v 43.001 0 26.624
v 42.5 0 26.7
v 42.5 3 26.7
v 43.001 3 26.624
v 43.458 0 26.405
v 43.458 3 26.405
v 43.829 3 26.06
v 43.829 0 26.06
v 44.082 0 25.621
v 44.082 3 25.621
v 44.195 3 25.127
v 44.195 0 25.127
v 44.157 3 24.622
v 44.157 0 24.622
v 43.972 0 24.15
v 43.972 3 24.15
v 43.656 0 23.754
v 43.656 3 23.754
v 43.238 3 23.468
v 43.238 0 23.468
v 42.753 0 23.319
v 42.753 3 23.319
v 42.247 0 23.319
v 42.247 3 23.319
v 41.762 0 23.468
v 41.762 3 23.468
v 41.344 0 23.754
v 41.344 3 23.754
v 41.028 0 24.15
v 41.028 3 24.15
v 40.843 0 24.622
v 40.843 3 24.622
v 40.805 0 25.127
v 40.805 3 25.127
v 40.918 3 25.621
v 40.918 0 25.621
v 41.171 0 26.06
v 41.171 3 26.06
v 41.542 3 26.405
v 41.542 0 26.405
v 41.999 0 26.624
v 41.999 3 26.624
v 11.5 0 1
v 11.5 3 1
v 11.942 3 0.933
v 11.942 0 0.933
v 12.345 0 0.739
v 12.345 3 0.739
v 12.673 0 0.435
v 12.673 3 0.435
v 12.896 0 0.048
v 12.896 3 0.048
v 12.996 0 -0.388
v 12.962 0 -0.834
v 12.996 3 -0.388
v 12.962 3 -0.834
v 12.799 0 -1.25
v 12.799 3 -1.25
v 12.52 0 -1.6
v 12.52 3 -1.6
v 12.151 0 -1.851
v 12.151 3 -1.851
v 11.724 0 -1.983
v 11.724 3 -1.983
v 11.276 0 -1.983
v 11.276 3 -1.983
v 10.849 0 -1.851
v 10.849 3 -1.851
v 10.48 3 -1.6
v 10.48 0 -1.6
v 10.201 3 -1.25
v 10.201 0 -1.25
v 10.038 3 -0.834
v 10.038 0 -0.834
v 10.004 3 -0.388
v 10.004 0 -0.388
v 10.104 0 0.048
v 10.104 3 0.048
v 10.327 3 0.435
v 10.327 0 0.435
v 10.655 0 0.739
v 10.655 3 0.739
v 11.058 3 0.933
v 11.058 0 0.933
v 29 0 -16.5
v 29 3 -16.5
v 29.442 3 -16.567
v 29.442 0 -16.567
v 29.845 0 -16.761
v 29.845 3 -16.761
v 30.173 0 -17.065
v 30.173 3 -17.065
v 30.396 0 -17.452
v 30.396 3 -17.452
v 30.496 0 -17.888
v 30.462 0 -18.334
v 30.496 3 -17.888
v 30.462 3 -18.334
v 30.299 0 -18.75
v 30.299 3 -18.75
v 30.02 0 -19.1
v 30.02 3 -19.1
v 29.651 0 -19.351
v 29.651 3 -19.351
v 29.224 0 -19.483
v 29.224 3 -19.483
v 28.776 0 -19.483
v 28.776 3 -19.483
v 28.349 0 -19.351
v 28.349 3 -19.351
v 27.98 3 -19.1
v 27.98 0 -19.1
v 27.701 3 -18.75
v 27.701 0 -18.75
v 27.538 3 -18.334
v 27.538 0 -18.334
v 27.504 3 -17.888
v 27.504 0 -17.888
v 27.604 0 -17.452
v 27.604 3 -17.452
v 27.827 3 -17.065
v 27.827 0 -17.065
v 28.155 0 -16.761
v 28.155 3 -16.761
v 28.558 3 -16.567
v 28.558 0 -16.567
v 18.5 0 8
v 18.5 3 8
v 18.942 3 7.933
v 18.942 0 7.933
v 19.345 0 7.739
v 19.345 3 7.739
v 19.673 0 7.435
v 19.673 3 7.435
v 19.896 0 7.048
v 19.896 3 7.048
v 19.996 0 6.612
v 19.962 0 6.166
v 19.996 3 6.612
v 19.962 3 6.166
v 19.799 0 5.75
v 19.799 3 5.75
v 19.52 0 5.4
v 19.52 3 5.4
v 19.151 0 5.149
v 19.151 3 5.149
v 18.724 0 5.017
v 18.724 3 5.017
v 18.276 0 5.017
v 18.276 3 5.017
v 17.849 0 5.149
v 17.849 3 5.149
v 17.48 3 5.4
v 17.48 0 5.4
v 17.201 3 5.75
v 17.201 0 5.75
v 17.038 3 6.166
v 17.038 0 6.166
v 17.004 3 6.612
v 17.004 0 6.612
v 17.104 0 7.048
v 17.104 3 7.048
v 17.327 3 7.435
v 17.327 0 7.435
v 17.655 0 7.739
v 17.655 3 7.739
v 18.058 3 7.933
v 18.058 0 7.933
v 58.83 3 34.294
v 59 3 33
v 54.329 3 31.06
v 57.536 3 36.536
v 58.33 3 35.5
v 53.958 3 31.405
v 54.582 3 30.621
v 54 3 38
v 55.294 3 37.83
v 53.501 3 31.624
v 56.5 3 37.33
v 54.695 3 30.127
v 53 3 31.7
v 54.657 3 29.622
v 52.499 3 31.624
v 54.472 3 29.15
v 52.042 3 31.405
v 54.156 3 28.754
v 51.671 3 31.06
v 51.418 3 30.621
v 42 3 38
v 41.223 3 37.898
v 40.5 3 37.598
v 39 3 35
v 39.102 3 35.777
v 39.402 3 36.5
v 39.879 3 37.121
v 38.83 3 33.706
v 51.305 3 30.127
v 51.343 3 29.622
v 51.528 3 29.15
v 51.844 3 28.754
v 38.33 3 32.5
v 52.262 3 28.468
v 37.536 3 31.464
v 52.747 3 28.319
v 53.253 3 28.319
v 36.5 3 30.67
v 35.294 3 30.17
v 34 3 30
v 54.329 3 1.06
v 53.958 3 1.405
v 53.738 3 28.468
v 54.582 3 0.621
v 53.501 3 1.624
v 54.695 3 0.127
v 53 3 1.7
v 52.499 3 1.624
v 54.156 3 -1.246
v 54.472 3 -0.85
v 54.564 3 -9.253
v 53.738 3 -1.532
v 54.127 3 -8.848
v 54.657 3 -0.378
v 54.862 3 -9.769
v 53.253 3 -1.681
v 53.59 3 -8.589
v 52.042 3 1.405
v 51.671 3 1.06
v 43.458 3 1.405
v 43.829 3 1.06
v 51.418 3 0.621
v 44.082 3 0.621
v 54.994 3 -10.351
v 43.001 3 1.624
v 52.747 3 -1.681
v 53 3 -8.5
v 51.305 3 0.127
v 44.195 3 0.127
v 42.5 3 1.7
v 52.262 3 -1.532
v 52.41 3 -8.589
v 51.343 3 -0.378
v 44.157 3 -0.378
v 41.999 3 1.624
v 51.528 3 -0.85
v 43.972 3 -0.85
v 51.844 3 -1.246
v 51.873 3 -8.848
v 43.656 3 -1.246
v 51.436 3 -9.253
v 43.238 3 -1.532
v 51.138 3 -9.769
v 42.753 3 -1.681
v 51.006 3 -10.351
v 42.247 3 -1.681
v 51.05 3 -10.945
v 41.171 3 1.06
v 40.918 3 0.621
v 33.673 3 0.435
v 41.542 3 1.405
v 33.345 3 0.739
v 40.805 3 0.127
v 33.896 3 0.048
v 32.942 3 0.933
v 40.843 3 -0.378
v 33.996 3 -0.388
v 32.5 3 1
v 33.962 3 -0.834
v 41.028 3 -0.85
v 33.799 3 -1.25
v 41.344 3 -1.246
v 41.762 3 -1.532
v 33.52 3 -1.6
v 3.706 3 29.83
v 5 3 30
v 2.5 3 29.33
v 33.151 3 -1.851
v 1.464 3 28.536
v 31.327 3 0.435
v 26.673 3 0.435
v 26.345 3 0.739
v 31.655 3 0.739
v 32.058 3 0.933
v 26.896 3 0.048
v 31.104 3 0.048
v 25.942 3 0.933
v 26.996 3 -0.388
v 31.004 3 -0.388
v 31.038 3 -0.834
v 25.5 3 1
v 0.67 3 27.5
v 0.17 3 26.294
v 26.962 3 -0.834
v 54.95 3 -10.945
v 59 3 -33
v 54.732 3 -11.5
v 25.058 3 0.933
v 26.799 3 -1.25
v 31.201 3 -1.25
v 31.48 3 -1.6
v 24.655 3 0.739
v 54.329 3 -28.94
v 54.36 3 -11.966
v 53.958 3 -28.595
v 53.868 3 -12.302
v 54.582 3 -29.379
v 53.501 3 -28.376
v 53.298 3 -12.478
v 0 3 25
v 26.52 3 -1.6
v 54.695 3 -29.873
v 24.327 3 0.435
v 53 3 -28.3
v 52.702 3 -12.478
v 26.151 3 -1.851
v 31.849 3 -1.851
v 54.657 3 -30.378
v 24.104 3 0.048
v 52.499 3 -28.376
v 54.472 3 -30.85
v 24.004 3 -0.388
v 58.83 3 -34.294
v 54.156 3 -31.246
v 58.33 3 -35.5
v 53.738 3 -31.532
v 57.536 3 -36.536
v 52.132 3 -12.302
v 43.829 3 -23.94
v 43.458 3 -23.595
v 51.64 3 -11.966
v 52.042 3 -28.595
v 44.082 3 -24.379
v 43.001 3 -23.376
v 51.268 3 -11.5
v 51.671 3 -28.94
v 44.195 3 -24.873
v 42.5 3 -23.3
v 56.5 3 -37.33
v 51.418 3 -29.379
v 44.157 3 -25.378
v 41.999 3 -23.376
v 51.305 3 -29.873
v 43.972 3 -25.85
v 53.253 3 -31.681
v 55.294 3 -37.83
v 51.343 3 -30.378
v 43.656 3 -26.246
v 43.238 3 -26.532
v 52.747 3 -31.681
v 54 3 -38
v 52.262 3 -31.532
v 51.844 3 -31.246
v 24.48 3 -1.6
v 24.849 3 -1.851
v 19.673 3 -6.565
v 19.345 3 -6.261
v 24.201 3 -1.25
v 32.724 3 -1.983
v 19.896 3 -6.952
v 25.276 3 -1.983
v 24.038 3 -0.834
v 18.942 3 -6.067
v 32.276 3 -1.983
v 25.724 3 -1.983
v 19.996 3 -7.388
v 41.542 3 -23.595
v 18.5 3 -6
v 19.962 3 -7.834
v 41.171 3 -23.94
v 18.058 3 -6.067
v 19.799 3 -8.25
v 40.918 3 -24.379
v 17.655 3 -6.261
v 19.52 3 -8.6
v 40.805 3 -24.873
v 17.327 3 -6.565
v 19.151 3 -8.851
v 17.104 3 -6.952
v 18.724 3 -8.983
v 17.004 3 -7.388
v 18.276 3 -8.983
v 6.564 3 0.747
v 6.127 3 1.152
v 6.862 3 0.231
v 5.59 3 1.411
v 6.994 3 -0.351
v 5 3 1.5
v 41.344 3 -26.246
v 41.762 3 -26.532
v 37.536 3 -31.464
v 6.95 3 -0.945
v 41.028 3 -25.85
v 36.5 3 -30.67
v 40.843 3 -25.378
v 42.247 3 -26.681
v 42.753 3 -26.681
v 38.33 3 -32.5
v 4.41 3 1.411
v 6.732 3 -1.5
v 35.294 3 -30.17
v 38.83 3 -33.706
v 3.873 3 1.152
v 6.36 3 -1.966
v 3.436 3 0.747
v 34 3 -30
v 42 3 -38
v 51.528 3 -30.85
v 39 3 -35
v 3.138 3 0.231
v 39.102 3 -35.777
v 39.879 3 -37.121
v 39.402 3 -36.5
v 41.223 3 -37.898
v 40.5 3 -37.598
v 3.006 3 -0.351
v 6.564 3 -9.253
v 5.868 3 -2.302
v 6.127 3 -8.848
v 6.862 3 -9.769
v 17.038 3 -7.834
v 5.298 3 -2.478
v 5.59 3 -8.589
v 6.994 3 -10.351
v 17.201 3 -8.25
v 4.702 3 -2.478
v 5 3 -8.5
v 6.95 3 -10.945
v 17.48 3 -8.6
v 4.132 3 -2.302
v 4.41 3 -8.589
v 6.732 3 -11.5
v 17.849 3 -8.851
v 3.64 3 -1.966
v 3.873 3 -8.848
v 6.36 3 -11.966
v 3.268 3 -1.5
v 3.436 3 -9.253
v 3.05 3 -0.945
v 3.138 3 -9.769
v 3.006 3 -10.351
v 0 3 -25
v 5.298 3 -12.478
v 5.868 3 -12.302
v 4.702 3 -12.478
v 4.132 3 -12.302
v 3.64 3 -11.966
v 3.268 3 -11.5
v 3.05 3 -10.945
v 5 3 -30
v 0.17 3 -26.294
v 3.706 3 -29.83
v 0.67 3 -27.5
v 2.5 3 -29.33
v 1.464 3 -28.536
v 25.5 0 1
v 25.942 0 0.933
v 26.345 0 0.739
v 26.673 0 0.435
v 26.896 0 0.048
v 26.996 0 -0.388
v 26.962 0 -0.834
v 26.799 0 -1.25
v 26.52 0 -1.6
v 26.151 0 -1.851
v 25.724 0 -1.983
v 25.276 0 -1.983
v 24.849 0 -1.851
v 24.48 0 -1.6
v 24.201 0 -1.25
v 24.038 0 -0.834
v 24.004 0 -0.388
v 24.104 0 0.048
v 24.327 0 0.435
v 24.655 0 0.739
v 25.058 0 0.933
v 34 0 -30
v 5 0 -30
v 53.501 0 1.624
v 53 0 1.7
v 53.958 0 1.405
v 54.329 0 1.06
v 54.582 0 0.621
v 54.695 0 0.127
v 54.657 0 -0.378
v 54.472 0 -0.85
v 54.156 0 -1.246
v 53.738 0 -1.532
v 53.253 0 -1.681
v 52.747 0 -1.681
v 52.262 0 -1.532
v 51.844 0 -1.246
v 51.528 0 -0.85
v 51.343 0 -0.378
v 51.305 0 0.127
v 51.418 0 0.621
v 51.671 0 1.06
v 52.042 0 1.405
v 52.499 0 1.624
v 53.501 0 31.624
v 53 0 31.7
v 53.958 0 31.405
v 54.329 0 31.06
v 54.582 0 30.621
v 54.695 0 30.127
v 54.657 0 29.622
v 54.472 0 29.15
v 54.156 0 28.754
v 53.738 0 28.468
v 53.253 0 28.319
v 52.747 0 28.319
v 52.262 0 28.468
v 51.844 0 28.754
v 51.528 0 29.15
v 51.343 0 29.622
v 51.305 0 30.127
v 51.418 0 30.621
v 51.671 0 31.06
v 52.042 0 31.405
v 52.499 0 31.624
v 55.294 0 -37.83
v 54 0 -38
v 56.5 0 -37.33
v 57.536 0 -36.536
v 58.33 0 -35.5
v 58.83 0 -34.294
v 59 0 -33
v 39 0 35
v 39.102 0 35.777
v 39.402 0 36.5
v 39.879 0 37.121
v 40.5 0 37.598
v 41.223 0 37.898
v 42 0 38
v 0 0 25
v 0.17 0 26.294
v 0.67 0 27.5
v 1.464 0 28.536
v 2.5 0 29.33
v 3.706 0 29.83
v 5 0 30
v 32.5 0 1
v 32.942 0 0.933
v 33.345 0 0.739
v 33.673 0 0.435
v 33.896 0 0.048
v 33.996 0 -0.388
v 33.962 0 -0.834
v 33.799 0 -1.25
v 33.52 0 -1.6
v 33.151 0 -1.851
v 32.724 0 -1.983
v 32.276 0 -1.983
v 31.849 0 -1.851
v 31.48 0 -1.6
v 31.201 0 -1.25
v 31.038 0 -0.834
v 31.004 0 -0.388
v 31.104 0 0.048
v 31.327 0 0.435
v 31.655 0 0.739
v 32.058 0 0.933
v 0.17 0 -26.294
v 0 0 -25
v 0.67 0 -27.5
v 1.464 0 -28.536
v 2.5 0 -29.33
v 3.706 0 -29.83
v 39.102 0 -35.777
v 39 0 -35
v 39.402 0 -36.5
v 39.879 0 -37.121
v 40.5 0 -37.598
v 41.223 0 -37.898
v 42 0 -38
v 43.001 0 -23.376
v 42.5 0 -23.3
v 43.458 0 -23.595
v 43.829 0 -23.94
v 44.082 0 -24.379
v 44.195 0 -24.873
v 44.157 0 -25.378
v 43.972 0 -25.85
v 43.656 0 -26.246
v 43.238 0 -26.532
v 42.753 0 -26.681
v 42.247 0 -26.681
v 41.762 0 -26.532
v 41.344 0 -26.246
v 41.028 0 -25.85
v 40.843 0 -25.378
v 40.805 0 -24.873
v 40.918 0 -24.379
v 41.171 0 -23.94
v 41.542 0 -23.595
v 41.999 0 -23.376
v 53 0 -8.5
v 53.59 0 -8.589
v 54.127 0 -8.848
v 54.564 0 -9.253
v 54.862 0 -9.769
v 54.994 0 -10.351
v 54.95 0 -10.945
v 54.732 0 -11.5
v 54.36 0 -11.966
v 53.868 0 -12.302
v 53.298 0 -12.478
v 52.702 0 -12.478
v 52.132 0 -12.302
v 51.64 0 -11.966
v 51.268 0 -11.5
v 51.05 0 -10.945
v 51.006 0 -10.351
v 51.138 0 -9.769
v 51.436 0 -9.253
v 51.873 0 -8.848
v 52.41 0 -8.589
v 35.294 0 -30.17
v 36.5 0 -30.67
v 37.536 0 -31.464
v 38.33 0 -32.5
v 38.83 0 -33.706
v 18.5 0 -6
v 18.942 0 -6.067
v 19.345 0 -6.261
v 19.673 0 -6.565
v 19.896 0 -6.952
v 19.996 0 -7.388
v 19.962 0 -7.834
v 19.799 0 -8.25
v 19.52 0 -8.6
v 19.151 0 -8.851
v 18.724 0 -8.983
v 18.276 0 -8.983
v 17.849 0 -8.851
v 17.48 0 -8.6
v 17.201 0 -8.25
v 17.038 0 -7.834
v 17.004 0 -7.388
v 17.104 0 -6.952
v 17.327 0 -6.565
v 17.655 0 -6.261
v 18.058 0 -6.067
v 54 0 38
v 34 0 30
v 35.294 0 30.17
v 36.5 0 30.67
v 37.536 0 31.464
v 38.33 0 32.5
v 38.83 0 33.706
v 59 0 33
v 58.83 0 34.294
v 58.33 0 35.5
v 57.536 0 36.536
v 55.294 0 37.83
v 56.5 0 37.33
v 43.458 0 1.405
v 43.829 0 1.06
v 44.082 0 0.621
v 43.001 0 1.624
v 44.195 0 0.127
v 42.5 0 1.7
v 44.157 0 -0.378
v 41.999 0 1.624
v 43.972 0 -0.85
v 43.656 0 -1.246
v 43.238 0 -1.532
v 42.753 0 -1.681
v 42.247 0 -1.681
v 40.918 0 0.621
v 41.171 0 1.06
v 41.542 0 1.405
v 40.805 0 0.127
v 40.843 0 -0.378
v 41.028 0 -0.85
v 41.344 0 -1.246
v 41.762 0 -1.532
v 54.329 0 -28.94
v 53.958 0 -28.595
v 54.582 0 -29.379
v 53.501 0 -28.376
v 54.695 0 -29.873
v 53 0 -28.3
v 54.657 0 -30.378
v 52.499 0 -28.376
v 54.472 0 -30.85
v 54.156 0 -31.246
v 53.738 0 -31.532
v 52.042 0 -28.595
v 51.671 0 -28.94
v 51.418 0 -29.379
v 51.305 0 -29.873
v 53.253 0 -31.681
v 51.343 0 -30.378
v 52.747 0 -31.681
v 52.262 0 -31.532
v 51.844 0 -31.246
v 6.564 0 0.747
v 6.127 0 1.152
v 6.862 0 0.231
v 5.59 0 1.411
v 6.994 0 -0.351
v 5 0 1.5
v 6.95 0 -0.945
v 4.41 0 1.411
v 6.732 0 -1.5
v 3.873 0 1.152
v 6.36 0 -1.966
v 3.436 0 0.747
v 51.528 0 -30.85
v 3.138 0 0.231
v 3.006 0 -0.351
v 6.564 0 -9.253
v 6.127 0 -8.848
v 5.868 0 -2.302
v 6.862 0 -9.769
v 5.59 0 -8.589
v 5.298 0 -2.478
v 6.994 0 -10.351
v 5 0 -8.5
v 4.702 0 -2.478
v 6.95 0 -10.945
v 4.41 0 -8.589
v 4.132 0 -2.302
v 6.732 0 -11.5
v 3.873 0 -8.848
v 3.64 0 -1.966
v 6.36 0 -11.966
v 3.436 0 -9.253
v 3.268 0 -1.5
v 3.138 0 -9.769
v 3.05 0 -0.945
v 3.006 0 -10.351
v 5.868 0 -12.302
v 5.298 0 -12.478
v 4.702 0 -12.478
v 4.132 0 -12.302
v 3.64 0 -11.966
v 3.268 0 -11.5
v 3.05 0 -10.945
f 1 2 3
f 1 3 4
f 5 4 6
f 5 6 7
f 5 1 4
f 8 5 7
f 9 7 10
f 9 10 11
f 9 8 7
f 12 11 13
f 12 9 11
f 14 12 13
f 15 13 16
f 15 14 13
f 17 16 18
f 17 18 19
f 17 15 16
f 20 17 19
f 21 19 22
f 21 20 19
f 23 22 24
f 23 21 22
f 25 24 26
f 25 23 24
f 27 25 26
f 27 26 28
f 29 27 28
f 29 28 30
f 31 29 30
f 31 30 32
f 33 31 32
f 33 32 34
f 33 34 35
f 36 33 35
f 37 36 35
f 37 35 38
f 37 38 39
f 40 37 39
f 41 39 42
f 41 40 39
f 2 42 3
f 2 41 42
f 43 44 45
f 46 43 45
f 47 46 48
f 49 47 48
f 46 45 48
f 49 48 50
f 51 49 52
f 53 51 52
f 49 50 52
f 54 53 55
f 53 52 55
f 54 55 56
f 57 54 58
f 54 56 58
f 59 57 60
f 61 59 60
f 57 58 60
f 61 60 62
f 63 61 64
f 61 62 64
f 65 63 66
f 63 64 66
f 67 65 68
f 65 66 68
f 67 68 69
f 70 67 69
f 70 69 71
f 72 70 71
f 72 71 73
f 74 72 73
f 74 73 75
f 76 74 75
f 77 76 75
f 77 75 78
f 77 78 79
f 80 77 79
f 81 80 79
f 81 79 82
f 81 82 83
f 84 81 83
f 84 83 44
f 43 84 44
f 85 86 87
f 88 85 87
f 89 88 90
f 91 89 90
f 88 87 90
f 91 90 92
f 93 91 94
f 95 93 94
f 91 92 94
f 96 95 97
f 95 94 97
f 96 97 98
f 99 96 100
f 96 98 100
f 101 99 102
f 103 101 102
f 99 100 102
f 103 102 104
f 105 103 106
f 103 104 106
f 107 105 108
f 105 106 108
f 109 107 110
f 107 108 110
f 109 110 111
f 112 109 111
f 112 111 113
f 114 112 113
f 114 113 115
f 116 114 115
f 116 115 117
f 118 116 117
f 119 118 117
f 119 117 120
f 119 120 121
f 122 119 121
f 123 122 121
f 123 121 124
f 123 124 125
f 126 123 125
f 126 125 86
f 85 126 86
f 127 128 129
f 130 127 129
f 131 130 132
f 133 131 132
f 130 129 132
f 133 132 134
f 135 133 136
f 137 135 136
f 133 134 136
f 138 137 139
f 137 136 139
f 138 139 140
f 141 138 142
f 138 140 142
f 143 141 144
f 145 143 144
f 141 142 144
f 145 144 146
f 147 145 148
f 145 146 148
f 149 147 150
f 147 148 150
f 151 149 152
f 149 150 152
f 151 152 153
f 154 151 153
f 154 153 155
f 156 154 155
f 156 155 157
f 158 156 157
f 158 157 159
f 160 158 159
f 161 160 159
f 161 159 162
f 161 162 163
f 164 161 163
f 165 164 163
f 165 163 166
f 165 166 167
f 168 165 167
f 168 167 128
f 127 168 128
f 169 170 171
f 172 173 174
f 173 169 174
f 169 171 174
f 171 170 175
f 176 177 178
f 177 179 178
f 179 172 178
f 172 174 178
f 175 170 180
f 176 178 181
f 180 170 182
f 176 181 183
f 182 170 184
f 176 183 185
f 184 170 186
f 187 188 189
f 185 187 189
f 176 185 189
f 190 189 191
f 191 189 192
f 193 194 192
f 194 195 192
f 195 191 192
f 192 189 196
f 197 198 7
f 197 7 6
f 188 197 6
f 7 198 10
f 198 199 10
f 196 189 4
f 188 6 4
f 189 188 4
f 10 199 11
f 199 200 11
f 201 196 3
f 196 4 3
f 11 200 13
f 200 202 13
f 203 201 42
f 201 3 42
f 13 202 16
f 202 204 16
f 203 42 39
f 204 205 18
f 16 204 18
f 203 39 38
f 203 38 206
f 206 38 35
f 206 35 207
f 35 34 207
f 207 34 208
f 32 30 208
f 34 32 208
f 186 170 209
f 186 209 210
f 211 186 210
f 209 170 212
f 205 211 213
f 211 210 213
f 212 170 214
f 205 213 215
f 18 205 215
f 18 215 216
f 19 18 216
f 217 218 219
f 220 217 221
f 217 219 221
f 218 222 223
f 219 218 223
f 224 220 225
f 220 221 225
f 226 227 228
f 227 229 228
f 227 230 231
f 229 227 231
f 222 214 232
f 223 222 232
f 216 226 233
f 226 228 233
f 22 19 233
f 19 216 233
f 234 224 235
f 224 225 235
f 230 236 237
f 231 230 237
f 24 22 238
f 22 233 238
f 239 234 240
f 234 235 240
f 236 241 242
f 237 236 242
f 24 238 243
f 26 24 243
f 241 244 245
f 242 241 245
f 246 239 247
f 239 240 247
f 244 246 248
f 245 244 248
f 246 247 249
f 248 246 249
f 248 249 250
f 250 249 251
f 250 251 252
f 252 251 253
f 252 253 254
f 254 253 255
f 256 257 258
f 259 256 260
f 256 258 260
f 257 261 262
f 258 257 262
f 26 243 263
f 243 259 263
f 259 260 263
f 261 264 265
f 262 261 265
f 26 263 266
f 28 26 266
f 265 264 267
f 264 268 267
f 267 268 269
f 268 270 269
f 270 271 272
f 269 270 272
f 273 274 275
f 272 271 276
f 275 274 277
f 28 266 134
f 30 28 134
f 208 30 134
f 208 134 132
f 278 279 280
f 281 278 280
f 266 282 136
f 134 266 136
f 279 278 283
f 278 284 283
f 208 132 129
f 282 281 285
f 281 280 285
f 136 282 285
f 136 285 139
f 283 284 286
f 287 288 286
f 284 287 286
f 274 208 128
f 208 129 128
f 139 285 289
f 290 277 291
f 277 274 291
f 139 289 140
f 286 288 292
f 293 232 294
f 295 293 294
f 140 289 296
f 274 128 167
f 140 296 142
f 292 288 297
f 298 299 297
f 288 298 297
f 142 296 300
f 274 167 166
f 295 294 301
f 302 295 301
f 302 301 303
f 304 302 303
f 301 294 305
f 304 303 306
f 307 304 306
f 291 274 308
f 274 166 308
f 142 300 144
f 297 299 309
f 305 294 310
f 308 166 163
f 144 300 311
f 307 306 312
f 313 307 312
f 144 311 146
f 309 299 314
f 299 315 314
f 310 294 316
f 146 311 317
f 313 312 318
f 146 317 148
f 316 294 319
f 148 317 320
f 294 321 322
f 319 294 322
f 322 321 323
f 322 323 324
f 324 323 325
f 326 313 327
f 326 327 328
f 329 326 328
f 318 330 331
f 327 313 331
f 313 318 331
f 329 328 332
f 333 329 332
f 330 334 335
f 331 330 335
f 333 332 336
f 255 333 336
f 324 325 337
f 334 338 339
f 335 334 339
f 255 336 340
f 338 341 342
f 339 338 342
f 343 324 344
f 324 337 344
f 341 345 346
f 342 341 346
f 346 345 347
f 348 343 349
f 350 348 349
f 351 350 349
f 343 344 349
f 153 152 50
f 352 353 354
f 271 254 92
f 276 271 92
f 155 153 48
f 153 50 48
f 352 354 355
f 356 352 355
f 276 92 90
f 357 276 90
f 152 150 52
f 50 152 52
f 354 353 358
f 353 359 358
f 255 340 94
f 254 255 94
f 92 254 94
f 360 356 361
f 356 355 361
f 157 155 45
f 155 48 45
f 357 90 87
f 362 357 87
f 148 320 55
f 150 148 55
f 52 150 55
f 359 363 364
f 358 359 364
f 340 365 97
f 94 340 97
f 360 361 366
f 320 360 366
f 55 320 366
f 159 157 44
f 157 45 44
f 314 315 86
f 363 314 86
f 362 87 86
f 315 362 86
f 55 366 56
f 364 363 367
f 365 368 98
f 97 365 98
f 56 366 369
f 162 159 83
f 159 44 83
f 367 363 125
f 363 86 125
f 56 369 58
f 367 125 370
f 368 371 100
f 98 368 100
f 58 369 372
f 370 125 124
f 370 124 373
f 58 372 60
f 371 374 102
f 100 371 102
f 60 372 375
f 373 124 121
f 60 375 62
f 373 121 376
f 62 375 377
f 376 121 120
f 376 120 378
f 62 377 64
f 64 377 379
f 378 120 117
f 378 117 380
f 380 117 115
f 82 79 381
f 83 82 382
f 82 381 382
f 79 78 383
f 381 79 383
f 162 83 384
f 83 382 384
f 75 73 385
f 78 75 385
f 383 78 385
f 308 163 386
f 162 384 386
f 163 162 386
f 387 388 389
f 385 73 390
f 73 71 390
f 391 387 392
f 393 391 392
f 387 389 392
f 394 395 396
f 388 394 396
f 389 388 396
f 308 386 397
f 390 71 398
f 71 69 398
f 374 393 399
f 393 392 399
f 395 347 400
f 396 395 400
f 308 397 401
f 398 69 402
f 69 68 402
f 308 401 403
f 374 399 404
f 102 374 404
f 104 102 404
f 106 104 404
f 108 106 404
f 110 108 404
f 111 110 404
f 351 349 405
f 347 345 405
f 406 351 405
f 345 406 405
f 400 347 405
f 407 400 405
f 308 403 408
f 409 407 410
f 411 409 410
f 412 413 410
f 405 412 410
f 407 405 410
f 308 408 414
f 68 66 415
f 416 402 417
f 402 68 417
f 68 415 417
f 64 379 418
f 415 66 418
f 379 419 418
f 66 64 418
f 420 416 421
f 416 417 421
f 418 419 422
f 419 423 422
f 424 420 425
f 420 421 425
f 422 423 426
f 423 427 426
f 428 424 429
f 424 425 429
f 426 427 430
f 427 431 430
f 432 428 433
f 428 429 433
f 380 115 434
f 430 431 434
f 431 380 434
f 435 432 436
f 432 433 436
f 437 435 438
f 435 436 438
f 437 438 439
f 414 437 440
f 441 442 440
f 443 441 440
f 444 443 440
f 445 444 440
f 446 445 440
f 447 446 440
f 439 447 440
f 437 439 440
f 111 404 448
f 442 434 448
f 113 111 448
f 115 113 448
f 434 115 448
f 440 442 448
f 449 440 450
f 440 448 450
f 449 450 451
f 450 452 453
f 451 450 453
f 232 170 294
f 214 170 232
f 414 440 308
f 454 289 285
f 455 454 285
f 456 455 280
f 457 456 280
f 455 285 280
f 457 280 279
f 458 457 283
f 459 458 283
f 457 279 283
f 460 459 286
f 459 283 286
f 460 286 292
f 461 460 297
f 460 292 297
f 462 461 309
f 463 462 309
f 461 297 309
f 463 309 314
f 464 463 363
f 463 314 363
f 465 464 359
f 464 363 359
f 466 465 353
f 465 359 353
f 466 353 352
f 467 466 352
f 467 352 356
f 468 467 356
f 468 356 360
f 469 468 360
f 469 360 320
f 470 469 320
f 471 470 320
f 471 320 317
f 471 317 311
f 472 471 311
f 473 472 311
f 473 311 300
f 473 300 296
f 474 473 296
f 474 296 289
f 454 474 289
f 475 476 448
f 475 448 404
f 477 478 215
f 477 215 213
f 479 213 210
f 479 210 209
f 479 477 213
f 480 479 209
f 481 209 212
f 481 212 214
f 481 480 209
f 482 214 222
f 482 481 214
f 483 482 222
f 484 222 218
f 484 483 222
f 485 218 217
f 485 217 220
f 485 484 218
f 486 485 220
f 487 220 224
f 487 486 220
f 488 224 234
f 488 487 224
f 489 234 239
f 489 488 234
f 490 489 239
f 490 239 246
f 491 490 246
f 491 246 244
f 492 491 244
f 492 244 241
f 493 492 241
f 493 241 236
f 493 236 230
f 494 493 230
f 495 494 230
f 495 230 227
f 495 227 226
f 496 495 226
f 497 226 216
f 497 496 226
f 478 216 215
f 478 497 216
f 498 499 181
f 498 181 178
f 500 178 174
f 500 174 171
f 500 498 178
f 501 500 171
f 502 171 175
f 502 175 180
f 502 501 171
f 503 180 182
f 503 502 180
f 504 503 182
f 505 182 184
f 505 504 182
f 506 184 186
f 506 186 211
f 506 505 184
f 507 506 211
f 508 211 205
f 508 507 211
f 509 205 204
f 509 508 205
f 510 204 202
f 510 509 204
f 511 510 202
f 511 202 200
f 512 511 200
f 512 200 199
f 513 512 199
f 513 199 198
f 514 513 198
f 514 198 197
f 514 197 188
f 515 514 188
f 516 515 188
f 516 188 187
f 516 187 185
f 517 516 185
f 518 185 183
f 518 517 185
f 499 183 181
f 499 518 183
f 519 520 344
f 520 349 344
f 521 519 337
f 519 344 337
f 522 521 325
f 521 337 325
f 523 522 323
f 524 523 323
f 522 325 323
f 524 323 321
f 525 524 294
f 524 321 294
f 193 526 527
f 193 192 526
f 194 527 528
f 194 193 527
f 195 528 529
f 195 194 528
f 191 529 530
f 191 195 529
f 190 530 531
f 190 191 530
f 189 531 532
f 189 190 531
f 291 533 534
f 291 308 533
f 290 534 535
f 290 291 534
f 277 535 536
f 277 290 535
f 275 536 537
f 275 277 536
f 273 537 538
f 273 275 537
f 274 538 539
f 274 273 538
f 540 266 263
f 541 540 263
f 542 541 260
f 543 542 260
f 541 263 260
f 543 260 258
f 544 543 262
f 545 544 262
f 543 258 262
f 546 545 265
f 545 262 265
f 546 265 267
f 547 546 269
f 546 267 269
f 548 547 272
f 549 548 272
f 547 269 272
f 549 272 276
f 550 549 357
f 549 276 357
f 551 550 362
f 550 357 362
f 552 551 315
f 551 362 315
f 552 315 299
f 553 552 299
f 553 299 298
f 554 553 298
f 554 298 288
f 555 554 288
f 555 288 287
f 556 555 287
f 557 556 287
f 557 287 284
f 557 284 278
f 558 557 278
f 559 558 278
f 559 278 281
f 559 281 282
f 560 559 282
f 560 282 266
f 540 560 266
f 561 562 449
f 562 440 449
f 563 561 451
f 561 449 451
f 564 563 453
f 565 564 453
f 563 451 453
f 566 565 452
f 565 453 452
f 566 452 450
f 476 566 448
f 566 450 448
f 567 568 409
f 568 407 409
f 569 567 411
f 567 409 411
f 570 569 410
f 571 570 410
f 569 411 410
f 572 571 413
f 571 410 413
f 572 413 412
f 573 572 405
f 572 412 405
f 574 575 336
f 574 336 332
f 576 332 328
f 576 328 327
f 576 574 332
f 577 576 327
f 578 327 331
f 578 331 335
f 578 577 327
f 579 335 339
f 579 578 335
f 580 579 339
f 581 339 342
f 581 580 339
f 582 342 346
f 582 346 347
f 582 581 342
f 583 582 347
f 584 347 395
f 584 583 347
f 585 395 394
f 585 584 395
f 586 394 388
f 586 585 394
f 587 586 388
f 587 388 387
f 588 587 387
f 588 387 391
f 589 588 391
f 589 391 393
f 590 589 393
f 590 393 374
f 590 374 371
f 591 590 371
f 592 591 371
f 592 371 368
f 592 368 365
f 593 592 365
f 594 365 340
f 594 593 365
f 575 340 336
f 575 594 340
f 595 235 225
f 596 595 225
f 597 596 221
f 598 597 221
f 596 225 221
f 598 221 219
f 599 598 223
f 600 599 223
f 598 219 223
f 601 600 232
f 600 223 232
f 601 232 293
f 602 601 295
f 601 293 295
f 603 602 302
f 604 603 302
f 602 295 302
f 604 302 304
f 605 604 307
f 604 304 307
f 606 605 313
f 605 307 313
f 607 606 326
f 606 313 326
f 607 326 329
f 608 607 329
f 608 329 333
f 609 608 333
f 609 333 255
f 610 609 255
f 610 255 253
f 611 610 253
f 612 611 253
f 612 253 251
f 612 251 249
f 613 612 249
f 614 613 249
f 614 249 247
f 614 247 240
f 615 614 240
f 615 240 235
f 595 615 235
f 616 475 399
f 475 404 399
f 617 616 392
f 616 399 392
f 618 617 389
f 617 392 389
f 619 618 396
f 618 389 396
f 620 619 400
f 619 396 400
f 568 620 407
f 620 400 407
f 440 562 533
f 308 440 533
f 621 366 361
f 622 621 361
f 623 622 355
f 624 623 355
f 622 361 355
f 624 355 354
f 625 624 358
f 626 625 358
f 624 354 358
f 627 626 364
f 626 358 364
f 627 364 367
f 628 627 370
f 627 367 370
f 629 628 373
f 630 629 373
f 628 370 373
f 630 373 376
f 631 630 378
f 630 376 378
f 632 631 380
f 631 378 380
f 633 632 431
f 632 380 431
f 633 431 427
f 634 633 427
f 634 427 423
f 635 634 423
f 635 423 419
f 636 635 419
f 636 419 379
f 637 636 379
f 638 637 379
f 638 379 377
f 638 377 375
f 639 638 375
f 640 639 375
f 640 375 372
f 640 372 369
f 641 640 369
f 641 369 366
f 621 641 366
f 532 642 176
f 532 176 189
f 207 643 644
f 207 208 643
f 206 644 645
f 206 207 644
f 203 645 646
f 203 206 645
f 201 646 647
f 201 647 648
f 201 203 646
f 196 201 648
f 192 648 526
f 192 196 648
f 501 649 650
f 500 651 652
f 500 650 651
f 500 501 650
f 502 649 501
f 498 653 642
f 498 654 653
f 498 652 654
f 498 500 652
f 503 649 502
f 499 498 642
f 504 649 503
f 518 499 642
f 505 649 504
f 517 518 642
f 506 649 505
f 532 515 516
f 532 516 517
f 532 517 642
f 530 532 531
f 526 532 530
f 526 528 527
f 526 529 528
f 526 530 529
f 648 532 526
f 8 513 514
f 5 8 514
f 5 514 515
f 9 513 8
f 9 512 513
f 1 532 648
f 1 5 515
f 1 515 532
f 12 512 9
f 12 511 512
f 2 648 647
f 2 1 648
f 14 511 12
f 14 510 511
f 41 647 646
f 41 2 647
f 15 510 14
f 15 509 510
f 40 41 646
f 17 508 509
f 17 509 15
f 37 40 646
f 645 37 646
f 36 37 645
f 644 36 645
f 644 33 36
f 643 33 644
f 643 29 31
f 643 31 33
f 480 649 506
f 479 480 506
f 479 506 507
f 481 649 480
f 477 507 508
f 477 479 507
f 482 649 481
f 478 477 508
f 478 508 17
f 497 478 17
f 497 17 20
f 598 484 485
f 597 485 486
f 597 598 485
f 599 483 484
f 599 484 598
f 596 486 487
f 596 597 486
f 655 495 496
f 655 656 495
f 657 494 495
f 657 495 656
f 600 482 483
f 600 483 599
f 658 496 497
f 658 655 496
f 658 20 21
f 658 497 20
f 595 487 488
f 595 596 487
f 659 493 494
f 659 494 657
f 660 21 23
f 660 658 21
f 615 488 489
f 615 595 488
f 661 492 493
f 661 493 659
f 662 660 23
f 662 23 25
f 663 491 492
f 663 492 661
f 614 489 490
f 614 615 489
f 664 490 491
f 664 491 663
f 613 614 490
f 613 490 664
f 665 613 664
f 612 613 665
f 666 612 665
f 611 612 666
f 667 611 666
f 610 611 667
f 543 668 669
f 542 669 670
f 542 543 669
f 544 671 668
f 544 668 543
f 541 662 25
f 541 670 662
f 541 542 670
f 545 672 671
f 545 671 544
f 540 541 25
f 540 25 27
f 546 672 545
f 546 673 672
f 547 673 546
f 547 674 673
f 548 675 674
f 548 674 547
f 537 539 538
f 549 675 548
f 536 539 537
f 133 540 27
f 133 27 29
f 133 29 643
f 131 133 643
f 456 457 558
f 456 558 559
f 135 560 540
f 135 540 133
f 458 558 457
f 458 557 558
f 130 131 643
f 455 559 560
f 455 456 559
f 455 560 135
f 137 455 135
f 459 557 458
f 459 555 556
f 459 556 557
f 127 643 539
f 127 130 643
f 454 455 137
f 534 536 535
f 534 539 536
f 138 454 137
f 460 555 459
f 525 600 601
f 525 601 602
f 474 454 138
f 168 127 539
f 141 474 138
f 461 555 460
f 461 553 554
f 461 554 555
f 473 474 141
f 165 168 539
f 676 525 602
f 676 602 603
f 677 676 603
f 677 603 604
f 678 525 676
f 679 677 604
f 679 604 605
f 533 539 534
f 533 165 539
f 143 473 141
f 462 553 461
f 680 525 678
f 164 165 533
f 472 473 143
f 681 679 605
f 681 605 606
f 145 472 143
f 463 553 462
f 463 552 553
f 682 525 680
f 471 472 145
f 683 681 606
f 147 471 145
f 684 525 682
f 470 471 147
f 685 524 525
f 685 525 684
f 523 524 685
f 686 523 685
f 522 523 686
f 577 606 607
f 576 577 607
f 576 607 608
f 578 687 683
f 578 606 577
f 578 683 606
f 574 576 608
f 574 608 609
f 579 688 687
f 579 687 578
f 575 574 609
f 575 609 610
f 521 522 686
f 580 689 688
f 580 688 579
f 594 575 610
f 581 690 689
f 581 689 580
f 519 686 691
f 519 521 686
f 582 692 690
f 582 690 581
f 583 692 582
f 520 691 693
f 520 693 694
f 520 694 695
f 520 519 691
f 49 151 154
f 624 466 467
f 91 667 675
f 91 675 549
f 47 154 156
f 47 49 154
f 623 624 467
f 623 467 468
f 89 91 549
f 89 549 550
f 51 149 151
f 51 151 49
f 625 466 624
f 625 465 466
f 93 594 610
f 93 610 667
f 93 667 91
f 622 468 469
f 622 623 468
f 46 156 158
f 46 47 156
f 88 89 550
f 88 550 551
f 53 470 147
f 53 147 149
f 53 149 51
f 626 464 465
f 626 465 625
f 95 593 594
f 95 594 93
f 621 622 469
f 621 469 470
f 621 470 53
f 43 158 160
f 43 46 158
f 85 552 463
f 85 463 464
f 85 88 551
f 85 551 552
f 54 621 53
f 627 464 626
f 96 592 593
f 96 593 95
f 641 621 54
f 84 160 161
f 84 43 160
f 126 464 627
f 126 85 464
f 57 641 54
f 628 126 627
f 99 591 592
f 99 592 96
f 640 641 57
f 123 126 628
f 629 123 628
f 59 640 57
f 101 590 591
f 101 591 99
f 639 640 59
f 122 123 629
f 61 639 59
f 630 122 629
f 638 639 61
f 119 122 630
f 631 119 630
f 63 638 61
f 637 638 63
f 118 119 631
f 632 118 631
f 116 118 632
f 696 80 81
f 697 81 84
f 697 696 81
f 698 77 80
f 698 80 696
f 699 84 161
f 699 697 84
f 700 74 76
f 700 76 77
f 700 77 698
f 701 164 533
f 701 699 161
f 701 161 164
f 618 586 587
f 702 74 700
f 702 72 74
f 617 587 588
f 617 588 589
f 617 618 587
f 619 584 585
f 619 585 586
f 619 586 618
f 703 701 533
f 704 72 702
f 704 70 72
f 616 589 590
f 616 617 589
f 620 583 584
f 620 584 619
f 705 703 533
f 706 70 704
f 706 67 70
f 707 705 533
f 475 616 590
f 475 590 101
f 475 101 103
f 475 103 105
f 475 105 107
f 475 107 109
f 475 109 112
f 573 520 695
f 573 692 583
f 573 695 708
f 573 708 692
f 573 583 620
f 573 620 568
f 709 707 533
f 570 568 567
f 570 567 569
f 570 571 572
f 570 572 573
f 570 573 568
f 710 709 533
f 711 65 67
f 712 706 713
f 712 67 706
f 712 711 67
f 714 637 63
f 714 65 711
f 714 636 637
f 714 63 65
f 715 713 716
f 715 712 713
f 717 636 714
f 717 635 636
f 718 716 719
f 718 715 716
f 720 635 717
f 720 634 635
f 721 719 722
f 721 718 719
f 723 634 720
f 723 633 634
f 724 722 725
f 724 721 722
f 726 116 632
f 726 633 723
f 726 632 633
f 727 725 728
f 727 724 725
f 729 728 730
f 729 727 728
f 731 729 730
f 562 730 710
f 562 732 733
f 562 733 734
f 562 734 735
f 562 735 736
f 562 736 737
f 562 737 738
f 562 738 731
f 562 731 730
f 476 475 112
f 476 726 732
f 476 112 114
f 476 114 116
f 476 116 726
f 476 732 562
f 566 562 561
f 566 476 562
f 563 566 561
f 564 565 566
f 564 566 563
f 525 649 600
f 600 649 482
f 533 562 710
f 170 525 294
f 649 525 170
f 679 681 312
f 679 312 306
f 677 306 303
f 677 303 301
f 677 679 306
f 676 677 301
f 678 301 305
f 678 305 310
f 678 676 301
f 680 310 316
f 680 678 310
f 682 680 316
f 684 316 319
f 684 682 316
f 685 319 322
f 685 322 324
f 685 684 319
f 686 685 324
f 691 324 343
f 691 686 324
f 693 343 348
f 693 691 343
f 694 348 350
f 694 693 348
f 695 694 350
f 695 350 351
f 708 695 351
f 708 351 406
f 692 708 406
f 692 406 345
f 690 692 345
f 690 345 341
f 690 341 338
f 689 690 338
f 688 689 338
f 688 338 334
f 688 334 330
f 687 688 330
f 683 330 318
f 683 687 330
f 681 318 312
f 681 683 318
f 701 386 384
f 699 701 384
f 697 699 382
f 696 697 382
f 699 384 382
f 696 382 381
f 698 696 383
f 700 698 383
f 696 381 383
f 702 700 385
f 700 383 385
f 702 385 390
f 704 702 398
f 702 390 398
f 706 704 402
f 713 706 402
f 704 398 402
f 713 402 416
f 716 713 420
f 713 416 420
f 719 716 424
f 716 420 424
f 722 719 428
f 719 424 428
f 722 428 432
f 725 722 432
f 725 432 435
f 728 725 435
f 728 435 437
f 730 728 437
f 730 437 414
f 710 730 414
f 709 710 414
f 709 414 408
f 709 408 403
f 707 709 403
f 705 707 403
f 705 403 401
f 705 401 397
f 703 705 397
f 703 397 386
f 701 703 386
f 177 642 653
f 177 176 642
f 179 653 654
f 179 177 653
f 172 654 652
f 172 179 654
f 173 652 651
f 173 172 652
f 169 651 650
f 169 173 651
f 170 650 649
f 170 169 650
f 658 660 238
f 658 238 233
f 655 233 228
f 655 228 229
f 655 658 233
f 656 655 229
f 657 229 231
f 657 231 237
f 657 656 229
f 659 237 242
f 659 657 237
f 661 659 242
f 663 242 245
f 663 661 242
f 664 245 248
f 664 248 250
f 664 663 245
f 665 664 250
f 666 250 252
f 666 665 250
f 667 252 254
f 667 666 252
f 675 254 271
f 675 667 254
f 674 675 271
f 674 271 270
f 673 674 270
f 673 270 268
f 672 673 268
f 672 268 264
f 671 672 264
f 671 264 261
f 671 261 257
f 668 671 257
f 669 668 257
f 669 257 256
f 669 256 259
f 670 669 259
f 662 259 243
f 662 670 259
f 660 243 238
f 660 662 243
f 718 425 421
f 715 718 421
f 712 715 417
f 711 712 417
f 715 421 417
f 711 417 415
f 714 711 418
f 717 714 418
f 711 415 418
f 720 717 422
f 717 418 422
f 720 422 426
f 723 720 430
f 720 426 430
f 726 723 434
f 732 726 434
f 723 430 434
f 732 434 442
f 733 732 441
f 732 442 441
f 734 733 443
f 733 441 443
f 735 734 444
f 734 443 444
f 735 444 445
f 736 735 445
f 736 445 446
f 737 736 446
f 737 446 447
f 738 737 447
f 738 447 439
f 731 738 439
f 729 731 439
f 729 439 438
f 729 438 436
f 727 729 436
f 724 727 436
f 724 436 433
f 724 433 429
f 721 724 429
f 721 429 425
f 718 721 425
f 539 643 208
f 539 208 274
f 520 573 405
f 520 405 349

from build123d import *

# Parameters (mm, degrees)
SKETCH_1_R          = 1.7
EXTRUDE_1_DEPTH     = 3
SKETCH_2_R          = 1.5
SKETCH_2_R_2        = 2
CUT_EXTRUDE_1_DEPTH = 71.242437315
FILLET_1_R          = 5
FILLET_2_R          = 3


with BuildPart() as part:
    # 草图1 → 凸台-拉伸1 (new body)
    with BuildSketch(Plane(origin=(0, 0, 0), x_dir=(1, 0, 0), z_dir=(0, 1, 0))):
        Polygon((0, 0), (0, 30), (39, 30), (39, 38), (59, 38), (59, -38), (39, -38), (39, -30), (0, -30), align=None)
        with Locations(Location((42.5, 25, 0), (0, 0, 270))):
            Circle(SKETCH_1_R, mode=Mode.SUBTRACT)
        with Locations(Location((42.5, -25, 0), (0, 0, 270))):
            Circle(SKETCH_1_R, mode=Mode.SUBTRACT)
        with Locations(Location((42.5, 0, 0), (0, 0, 270))):
            Circle(SKETCH_1_R, mode=Mode.SUBTRACT)
        with Locations(Location((53, 30, 0), (0, 0, 270))):
            Circle(SKETCH_1_R, mode=Mode.SUBTRACT)
        with Locations(Location((53, 0, 0), (0, 0, 270))):
            Circle(SKETCH_1_R, mode=Mode.SUBTRACT)
        with Locations(Location((53, -30, 0), (0, 0, 270))):
            Circle(SKETCH_1_R, mode=Mode.SUBTRACT)
    extrude(amount=EXTRUDE_1_DEPTH)

    # 草图2 → 切除-拉伸1 (cut, through all)
    with BuildSketch(Plane(origin=(0, 3, 0), x_dir=(1, 0, 0), z_dir=(0, 1, 0))):
        with Locations(Location((32.5, 0.5, 0), (0, 0, 270))):
            Circle(SKETCH_2_R)
        with Locations(Location((5, 0.5, 0), (0, 0, 270))):
            Circle(SKETCH_2_R_2)
        with Locations(Location((5, 10.5, 0), (0, 0, 270))):
            Circle(SKETCH_2_R_2)
        with Locations(Location((53, 10.5, 0), (0, 0, 270))):
            Circle(SKETCH_2_R_2)
        with Locations(Location((29, 18, 0), (0, 0, 270))):
            Circle(SKETCH_2_R)
        with Locations(Location((18.5, -6.5, 0), (0, 0, 270))):
            Circle(SKETCH_2_R)
        with Locations(Location((11.5, 0.5, 0), (0, 0, 270))):
            Circle(SKETCH_2_R)
        with Locations(Location((25.5, 0.5, 0), (0, 0, 270))):
            Circle(SKETCH_2_R)
        with Locations(Location((18.5, 7.5, 0), (0, 0, 270))):
            Circle(SKETCH_2_R)
    extrude(amount=-CUT_EXTRUDE_1_DEPTH, mode=Mode.SUBTRACT)

    # 圆角1
    fillet_1_edges = [part.edges().sort_by_distance(p)[0] for p in [
        (59, 1.5, 38),
        (39, 1.5, 30),
        (0, 1.5, 30),
        (0, 1.5, -30),
        (39, 1.5, -30),
        (59, 1.5, -38),
    ]]
    fillet(fillet_1_edges, radius=FILLET_1_R)

    # 圆角2
    fillet_2_edges = [part.edges().sort_by_distance(p)[0] for p in [
        (39, 1.5, 38),
        (39, 1.5, -38),
    ]]
    fillet(fillet_2_edges, radius=FILLET_2_R - 0.0001)  # a hair under: the kernel refuses the full size


solid = part.part
